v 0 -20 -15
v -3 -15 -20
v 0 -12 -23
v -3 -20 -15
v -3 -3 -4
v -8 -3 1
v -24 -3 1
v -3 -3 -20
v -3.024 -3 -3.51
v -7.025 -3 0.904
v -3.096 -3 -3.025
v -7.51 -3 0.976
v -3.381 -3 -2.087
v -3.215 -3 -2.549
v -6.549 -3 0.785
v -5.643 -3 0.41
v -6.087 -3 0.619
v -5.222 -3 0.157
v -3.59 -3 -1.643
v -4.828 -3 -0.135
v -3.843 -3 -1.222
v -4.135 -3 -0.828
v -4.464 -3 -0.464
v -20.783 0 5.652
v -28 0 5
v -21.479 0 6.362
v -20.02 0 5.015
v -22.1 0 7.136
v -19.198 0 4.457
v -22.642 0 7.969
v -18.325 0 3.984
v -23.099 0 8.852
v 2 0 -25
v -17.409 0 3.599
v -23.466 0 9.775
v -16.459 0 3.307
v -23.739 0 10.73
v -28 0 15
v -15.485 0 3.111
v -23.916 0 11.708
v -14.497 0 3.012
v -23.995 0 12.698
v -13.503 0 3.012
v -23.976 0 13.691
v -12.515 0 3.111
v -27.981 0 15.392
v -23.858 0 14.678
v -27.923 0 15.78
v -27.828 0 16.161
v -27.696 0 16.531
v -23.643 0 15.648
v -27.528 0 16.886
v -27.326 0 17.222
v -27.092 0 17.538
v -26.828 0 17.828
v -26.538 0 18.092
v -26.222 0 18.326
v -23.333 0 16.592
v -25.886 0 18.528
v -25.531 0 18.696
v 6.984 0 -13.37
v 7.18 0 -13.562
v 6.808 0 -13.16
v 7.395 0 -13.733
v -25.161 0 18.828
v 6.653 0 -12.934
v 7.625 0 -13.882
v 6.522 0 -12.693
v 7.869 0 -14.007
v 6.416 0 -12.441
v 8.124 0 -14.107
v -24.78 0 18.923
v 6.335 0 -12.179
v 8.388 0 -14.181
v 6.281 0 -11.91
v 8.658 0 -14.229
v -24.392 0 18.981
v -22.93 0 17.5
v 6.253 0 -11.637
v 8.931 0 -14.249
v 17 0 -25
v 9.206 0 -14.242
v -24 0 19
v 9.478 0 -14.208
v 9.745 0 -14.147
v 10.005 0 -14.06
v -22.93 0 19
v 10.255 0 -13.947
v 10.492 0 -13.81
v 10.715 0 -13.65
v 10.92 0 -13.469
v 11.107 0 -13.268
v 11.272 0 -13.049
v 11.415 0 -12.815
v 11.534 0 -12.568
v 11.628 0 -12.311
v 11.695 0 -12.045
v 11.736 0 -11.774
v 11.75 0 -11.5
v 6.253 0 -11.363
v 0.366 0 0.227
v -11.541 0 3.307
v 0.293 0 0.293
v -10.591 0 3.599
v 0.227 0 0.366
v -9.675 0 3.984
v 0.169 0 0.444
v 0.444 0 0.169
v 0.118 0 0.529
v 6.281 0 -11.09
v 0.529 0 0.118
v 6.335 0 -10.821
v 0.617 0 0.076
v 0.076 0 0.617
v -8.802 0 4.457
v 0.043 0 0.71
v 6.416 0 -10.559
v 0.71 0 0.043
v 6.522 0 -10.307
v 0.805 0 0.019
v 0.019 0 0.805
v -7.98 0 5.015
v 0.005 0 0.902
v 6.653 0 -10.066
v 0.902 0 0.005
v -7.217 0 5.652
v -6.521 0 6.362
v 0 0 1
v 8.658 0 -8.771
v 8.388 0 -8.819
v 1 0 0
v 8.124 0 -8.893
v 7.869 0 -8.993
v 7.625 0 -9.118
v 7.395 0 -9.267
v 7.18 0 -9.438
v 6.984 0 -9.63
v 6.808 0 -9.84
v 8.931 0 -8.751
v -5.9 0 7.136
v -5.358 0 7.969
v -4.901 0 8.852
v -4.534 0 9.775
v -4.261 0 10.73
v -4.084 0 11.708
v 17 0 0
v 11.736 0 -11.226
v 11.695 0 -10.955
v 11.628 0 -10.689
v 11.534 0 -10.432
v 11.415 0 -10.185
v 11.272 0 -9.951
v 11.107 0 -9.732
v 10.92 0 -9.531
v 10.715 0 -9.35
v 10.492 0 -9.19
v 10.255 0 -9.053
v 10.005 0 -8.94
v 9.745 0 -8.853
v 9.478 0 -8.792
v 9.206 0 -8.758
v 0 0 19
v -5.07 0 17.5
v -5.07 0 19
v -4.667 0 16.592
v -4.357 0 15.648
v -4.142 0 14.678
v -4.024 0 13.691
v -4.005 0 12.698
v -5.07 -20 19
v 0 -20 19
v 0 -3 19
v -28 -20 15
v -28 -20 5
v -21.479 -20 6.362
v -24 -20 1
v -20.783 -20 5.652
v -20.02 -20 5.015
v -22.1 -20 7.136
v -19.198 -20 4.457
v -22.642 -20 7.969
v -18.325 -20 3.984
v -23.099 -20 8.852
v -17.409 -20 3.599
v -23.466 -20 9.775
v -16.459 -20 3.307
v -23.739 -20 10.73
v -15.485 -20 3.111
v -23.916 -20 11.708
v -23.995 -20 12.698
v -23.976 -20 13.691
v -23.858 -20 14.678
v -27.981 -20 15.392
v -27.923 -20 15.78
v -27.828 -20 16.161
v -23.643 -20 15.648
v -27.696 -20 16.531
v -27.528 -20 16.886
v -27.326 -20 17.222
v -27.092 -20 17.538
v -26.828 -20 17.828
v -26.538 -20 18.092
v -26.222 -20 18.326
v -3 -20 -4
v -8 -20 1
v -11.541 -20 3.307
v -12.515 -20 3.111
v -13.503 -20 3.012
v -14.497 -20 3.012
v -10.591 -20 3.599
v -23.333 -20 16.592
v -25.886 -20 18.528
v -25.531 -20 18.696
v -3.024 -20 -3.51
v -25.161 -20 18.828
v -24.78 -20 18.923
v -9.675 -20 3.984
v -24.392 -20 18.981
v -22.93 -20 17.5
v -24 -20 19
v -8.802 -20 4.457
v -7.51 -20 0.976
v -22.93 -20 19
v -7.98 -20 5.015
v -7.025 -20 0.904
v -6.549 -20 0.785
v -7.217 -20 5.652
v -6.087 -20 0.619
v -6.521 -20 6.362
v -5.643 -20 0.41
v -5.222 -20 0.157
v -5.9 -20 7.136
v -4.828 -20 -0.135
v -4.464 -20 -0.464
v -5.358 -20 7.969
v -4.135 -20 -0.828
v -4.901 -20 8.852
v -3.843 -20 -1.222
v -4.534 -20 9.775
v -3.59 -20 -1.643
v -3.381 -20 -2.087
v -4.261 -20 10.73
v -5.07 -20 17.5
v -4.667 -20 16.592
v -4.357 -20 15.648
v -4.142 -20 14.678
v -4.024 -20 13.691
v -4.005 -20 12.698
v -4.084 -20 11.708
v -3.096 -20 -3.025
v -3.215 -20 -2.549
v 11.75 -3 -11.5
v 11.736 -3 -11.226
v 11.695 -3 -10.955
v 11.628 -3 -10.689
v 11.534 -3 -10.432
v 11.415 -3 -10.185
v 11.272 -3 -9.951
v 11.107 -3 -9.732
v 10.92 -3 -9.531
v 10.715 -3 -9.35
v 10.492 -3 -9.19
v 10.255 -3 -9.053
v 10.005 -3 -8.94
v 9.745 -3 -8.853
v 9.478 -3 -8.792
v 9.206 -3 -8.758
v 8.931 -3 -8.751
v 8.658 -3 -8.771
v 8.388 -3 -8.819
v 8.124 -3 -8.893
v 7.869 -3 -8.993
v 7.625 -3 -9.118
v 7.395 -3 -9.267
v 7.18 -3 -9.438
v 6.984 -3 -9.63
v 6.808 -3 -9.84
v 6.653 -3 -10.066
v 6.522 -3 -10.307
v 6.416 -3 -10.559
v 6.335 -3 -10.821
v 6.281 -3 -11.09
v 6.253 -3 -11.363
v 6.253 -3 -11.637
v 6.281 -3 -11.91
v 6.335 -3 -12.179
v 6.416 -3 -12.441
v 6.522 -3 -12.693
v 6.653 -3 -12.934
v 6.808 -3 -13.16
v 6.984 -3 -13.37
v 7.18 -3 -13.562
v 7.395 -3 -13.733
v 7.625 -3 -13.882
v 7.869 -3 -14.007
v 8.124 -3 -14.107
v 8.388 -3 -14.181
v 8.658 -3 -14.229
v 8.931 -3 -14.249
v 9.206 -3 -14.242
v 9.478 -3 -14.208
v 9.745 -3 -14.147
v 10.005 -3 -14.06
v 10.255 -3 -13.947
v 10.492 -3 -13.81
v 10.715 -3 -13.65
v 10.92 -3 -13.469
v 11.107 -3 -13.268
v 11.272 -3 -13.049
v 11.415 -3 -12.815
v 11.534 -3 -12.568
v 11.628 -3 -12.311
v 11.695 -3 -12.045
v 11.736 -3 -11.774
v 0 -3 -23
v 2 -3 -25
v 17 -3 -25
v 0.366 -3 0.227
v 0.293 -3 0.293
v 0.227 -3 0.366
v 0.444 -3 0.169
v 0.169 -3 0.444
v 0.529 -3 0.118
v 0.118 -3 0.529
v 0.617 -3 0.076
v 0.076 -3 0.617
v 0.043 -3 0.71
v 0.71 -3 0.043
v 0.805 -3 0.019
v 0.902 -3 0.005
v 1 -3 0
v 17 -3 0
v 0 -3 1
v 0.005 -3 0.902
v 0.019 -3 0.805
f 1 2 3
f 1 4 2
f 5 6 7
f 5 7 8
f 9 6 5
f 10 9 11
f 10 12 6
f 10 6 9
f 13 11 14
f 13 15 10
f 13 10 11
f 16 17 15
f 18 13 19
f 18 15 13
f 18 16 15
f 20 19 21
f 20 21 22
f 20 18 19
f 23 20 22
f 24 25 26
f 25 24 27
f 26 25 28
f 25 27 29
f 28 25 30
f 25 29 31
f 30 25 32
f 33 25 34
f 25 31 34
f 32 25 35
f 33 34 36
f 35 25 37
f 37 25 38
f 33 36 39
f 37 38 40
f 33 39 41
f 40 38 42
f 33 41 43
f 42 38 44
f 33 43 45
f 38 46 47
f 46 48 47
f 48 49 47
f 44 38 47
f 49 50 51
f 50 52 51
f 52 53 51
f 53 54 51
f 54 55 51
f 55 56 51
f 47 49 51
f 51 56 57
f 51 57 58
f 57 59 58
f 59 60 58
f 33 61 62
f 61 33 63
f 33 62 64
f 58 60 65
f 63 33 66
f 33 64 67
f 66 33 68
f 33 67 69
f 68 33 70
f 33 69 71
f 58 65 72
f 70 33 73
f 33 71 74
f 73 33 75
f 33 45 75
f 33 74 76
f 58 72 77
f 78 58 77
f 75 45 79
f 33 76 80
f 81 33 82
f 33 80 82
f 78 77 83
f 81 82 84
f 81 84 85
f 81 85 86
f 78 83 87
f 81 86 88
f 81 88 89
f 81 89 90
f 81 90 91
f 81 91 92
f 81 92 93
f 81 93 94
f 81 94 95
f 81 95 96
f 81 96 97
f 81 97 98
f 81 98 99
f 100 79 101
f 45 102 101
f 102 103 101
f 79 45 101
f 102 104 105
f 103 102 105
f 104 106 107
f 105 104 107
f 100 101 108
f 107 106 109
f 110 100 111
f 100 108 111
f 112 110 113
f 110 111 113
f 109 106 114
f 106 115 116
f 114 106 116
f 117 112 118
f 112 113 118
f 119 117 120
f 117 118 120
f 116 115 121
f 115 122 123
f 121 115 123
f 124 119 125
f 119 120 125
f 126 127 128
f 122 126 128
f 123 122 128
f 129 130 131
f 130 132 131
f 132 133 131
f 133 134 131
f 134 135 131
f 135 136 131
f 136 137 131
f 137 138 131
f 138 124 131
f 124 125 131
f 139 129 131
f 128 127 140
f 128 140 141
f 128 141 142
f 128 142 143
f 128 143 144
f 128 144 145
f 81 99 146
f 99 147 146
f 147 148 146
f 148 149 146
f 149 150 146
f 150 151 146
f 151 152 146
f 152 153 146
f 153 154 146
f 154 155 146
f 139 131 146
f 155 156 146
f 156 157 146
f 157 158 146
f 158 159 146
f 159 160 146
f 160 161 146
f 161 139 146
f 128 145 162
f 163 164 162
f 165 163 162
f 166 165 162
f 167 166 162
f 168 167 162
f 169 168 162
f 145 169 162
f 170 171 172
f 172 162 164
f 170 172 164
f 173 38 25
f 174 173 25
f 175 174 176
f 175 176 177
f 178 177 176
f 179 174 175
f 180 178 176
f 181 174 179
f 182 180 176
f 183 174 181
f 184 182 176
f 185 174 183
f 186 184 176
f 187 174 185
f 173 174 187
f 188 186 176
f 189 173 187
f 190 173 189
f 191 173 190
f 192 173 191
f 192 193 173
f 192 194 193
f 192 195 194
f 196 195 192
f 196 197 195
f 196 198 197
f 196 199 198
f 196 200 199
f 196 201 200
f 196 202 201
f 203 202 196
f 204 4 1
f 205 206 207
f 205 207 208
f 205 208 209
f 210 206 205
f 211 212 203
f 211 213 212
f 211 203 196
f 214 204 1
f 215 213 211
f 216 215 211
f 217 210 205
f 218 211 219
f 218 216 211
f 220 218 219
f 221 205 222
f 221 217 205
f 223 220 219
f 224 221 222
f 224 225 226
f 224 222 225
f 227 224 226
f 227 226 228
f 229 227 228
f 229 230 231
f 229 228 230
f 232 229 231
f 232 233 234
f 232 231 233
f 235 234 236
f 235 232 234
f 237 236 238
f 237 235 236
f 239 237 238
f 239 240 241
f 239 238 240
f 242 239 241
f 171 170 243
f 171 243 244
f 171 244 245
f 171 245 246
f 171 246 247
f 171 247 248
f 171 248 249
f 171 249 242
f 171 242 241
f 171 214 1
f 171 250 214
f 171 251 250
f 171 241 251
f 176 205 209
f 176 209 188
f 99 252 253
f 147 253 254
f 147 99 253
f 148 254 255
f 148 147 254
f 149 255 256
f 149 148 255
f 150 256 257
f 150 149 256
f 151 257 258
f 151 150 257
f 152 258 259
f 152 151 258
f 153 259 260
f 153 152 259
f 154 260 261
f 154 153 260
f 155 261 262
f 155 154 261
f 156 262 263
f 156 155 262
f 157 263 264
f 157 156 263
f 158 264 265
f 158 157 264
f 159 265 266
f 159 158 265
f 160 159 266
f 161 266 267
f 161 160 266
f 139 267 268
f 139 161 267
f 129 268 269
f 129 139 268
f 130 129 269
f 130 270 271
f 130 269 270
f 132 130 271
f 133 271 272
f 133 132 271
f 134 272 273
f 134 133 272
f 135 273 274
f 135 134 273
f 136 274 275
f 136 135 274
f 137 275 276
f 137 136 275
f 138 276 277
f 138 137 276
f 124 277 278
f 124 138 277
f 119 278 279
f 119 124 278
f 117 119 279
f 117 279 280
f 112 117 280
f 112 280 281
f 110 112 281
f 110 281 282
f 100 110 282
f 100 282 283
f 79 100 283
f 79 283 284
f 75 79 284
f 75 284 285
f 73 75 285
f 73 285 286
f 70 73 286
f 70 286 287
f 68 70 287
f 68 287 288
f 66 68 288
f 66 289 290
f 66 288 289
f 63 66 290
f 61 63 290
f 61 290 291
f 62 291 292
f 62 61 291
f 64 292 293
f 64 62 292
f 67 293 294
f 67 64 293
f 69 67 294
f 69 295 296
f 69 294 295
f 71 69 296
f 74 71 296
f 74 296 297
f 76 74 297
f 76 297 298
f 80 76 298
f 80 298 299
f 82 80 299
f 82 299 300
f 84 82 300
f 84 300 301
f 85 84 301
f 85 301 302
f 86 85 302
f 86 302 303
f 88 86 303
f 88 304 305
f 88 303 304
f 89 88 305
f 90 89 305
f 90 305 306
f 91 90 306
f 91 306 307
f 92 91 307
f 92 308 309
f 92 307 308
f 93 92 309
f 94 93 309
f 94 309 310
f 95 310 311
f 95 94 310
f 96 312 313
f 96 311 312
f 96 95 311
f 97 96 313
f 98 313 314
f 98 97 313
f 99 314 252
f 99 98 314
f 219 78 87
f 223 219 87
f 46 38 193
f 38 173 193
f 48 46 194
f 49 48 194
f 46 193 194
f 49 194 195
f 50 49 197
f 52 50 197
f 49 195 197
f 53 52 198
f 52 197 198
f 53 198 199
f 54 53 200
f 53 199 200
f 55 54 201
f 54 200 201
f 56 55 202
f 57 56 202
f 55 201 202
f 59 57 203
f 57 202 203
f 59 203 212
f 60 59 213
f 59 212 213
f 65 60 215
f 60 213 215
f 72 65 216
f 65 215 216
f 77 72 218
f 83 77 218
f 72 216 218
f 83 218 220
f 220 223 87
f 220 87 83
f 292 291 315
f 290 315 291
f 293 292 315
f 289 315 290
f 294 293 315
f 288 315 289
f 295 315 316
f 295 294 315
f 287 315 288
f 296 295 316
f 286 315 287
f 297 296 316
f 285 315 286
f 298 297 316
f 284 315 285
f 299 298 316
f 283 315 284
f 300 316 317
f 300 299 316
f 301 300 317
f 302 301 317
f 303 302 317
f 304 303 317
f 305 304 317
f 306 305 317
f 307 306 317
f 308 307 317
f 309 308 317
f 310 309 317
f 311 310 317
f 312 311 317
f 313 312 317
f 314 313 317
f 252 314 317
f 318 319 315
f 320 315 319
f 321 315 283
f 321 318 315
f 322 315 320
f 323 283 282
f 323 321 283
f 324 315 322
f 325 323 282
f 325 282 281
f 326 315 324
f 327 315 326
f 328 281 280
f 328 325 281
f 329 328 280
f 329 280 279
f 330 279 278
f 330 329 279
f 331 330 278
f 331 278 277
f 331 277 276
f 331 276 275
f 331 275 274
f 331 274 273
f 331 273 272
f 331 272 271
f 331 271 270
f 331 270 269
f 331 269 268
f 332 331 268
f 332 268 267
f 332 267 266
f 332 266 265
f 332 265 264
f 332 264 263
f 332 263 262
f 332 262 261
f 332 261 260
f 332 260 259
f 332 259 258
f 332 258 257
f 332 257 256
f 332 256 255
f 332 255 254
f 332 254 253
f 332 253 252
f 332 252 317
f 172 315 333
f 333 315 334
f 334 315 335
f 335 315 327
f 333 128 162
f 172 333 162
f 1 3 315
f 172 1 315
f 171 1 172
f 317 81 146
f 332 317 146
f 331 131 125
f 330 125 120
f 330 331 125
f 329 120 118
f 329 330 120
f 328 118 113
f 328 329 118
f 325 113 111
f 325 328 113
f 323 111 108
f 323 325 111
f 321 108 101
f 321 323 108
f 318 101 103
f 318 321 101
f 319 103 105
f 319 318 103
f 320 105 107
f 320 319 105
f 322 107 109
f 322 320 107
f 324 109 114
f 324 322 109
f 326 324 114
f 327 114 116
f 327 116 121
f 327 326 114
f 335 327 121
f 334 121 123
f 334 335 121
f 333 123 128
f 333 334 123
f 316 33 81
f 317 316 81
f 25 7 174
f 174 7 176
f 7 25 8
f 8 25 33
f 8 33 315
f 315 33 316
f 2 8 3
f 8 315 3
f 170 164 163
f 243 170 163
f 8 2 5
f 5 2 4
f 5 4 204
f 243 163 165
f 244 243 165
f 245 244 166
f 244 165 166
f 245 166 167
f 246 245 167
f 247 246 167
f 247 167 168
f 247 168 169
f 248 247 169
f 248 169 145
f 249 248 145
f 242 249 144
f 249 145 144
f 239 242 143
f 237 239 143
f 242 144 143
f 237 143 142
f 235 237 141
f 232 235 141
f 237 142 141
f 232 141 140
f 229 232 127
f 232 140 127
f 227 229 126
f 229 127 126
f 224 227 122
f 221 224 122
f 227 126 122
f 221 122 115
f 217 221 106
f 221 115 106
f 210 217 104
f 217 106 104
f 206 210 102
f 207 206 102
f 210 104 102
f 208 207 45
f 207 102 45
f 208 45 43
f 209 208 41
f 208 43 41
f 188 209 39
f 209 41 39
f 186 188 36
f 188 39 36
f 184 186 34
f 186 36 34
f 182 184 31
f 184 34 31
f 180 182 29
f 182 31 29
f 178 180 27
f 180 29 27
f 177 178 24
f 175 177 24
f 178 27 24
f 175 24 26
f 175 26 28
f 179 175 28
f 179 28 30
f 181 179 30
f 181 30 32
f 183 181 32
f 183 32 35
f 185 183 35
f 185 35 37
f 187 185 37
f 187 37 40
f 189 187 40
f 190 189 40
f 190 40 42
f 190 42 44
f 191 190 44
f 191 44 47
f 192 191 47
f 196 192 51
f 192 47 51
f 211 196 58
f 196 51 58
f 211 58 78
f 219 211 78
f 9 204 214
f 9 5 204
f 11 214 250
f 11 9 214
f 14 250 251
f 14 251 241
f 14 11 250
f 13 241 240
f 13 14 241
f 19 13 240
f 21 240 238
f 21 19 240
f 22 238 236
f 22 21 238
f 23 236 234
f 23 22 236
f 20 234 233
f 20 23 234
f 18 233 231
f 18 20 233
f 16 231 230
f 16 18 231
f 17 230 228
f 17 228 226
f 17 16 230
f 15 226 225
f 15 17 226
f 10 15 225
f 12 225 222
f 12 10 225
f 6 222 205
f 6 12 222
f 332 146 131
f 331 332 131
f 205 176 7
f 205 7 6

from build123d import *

# Parameters (mm, degrees)
F0_R     = 2.75
F1_DEPTH = 20
F2_SIZE  = 30
F3_R     = 1
F4_R     = 4
F5_SIZE  = 10
F6_W     = 24.290481
F6_H     = 31.840974
F6_W_2   = 17.983475
F6_H_2   = 49.393533
F7_DEPTH = 17
F8_R     = 5


with BuildPart() as f1:
    # F0 (on Front) → F1 (new body)
    with BuildSketch(Plane.XZ):
        with BuildLine():
            ThreePointArc((-5.069714, 17.5), (-14, 3), (-22.930286, 17.5))
            Line((-22.930286, 17.5), (-22.930286, 19))
            Line((-22.930286, 19), (-28, 19))
            Line((-28, 19), (-28, -25))
            Line((-28, -25), (17, -25))
            Line((17, -25), (17, 0))
            Line((17, 0), (0, 0))
            Line((0, 0), (0, 19))
            Line((0, 19), (-5.069714, 19))
            Line((-5.069714, 19), (-5.069714, 17.5))
        make_face()
        with Locations((9, -11.5)):
            Circle(F0_R, mode=Mode.SUBTRACT)
    extrude(amount=F1_DEPTH)

    # F2
    f2_edges = [f1.edges().sort_by_distance(p)[0] for p in [
        (-28, -10, -25),
    ]]
    chamfer(f2_edges, length=F2_SIZE)

    # F3
    f3_edges = [f1.edges().sort_by_distance(p)[0] for p in [
        (0, -10, 0),
    ]]
    fillet(f3_edges, radius=F3_R)

    # F4
    f4_edges = [f1.edges().sort_by_distance(p)[0] for p in [
        (-28, -10, 19),
    ]]
    fillet(f4_edges, radius=F4_R)

    # F5
    f5_edges = [f1.edges().sort_by_distance(p)[0] for p in [
        (9.5, -20, -25),
    ]]
    chamfer(f5_edges, length=F5_SIZE)

    # F6 (on face) → F7 (cut)
    with BuildSketch(Plane.XZ.offset(20)):
        with Locations((-15.14524, -14.920487)):
            Rectangle(F6_W, F6_H)
        with Locations((8.991737, -5.696766)):
            Rectangle(F6_W_2, F6_H_2)
    extrude(amount=-F7_DEPTH, mode=Mode.SUBTRACT)

    # F8
    f8_edges = [f1.edges().sort_by_distance(p)[0] for p in [
        (-3, -11.5, 1),
    ]]
    fillet(f8_edges, radius=F8_R)


solid = f1.part
